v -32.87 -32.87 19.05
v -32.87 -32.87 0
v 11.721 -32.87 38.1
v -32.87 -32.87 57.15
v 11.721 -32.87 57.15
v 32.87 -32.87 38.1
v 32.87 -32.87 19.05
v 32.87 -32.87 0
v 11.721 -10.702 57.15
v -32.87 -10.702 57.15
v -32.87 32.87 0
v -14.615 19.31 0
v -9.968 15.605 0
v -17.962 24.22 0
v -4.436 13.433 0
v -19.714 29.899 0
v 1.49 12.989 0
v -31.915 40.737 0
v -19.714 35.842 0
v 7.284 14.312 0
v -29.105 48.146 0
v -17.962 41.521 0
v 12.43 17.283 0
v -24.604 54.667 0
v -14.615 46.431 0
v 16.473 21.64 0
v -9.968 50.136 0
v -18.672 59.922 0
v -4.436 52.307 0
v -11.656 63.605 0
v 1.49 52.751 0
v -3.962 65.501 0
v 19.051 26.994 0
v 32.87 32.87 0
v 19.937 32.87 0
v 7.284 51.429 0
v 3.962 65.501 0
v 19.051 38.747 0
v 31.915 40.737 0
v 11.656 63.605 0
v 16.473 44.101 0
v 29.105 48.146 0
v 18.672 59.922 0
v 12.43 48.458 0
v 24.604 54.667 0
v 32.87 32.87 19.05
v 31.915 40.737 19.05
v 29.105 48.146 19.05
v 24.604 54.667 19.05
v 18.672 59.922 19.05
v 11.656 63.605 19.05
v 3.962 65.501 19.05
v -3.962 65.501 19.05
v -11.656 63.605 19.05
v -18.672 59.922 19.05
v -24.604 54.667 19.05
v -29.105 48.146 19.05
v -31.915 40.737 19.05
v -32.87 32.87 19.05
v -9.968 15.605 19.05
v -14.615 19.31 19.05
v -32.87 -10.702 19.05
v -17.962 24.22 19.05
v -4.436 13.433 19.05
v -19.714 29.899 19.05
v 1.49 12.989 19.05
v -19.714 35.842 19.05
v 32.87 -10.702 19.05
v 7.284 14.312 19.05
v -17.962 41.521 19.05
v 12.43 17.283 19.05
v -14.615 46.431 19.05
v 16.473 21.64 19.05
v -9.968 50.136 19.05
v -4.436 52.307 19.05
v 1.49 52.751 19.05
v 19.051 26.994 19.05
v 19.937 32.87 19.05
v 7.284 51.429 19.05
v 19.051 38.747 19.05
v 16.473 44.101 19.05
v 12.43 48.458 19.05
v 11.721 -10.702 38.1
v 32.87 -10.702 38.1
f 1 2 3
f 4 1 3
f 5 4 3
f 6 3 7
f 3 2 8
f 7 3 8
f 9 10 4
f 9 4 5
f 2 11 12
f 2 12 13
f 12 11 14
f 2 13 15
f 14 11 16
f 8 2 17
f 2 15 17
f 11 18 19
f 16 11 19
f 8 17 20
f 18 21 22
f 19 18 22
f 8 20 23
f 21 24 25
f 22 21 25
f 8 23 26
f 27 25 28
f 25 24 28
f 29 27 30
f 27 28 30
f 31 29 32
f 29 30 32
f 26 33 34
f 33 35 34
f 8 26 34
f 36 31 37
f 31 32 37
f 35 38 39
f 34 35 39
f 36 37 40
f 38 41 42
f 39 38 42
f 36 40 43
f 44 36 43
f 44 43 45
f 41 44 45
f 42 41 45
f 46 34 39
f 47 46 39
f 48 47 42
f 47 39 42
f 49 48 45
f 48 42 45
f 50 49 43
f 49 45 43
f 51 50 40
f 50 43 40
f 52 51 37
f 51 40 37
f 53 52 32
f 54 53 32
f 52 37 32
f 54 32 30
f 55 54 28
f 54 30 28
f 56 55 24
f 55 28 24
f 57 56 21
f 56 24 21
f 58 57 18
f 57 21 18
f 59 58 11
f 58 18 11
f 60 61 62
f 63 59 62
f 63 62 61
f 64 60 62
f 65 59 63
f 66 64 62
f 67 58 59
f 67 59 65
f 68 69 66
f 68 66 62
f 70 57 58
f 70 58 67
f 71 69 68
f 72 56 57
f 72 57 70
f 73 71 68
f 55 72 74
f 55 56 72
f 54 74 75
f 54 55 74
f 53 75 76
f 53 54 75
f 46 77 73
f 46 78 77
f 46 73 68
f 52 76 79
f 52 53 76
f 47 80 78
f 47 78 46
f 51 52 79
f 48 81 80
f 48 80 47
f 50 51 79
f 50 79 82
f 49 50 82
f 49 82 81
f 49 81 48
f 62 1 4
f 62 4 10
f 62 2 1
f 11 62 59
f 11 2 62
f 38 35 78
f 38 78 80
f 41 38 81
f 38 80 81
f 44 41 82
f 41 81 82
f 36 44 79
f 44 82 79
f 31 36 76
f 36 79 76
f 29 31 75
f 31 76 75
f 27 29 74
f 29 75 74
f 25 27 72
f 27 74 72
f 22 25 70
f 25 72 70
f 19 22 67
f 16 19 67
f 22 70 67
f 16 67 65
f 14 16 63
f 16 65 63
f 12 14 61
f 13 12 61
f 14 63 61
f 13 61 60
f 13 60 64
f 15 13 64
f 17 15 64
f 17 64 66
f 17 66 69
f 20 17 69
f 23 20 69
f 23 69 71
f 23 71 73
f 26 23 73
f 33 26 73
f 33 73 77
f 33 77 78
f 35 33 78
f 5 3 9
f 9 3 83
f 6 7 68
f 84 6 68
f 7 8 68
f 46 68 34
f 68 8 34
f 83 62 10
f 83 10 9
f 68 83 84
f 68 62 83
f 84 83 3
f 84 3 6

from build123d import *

# Parameters (mm, degrees)
F1_DEPTH = 19.05
F2_W     = 44.5915646851
F2_H     = 22.1683774143
F3_DEPTH = 38.1
F4_W     = 21.1491398513
F4_H     = 22.1683774143
F5_DEPTH = 19.05
F6_R     = 19.9367778841
F7_DEPTH = 25.4


with BuildPart() as f1:
    # F0 (on Top) → F1 (new body)
    with BuildSketch(Plane.XY):
        with BuildLine():
            ThreePointArc((32.8703522682, 32.8703522682), (0, 65.7407045364), (-32.8703522682, 32.8703522682))
            Line((-32.8703522682, 32.8703522682), (32.8703522682, 32.8703522682))
        make_face()
        with BuildLine():
            ThreePointArc((32.8703522682, 32.8703522682), (0, 0), (-32.8703522682, 32.8703522682))
            Line((-32.8703522682, 32.8703522682), (-32.8703522682, -32.8703522682))
            Line((-32.8703522682, -32.8703522682), (32.8703522682, -32.8703522682))
            Line((32.8703522682, -32.8703522682), (32.8703522682, 32.8703522682))
        make_face()
        with BuildLine():
            Line((32.8703522682, 32.8703522682), (-32.8703522682, 32.8703522682))
            ThreePointArc((-32.8703522682, 32.8703522682), (0, 0), (32.8703522682, 32.8703522682))
        make_face()
    extrude(amount=F1_DEPTH)

    # F2 (on face) → F3 (join)
    with BuildSketch(Plane.XY.offset(19.05)):
        with Locations((-10.5745699257, -21.786163561)):
            Rectangle(F2_W, F2_H)
    extrude(amount=F3_DEPTH)

    # F4 (on face) → F5 (join)
    with BuildSketch(Plane.XY.offset(19.05)):
        with Locations((22.2957823426, -21.786163561)):
            Rectangle(F4_W, F4_H)
    extrude(amount=F5_DEPTH)

    # F6 (on face) → F7 (cut)
    with BuildSketch(Plane.XY.offset(19.05)):
        with Locations((0, 32.8703522682)):
            Circle(F6_R)
    extrude(amount=-F7_DEPTH, mode=Mode.SUBTRACT)


solid = f1.part
